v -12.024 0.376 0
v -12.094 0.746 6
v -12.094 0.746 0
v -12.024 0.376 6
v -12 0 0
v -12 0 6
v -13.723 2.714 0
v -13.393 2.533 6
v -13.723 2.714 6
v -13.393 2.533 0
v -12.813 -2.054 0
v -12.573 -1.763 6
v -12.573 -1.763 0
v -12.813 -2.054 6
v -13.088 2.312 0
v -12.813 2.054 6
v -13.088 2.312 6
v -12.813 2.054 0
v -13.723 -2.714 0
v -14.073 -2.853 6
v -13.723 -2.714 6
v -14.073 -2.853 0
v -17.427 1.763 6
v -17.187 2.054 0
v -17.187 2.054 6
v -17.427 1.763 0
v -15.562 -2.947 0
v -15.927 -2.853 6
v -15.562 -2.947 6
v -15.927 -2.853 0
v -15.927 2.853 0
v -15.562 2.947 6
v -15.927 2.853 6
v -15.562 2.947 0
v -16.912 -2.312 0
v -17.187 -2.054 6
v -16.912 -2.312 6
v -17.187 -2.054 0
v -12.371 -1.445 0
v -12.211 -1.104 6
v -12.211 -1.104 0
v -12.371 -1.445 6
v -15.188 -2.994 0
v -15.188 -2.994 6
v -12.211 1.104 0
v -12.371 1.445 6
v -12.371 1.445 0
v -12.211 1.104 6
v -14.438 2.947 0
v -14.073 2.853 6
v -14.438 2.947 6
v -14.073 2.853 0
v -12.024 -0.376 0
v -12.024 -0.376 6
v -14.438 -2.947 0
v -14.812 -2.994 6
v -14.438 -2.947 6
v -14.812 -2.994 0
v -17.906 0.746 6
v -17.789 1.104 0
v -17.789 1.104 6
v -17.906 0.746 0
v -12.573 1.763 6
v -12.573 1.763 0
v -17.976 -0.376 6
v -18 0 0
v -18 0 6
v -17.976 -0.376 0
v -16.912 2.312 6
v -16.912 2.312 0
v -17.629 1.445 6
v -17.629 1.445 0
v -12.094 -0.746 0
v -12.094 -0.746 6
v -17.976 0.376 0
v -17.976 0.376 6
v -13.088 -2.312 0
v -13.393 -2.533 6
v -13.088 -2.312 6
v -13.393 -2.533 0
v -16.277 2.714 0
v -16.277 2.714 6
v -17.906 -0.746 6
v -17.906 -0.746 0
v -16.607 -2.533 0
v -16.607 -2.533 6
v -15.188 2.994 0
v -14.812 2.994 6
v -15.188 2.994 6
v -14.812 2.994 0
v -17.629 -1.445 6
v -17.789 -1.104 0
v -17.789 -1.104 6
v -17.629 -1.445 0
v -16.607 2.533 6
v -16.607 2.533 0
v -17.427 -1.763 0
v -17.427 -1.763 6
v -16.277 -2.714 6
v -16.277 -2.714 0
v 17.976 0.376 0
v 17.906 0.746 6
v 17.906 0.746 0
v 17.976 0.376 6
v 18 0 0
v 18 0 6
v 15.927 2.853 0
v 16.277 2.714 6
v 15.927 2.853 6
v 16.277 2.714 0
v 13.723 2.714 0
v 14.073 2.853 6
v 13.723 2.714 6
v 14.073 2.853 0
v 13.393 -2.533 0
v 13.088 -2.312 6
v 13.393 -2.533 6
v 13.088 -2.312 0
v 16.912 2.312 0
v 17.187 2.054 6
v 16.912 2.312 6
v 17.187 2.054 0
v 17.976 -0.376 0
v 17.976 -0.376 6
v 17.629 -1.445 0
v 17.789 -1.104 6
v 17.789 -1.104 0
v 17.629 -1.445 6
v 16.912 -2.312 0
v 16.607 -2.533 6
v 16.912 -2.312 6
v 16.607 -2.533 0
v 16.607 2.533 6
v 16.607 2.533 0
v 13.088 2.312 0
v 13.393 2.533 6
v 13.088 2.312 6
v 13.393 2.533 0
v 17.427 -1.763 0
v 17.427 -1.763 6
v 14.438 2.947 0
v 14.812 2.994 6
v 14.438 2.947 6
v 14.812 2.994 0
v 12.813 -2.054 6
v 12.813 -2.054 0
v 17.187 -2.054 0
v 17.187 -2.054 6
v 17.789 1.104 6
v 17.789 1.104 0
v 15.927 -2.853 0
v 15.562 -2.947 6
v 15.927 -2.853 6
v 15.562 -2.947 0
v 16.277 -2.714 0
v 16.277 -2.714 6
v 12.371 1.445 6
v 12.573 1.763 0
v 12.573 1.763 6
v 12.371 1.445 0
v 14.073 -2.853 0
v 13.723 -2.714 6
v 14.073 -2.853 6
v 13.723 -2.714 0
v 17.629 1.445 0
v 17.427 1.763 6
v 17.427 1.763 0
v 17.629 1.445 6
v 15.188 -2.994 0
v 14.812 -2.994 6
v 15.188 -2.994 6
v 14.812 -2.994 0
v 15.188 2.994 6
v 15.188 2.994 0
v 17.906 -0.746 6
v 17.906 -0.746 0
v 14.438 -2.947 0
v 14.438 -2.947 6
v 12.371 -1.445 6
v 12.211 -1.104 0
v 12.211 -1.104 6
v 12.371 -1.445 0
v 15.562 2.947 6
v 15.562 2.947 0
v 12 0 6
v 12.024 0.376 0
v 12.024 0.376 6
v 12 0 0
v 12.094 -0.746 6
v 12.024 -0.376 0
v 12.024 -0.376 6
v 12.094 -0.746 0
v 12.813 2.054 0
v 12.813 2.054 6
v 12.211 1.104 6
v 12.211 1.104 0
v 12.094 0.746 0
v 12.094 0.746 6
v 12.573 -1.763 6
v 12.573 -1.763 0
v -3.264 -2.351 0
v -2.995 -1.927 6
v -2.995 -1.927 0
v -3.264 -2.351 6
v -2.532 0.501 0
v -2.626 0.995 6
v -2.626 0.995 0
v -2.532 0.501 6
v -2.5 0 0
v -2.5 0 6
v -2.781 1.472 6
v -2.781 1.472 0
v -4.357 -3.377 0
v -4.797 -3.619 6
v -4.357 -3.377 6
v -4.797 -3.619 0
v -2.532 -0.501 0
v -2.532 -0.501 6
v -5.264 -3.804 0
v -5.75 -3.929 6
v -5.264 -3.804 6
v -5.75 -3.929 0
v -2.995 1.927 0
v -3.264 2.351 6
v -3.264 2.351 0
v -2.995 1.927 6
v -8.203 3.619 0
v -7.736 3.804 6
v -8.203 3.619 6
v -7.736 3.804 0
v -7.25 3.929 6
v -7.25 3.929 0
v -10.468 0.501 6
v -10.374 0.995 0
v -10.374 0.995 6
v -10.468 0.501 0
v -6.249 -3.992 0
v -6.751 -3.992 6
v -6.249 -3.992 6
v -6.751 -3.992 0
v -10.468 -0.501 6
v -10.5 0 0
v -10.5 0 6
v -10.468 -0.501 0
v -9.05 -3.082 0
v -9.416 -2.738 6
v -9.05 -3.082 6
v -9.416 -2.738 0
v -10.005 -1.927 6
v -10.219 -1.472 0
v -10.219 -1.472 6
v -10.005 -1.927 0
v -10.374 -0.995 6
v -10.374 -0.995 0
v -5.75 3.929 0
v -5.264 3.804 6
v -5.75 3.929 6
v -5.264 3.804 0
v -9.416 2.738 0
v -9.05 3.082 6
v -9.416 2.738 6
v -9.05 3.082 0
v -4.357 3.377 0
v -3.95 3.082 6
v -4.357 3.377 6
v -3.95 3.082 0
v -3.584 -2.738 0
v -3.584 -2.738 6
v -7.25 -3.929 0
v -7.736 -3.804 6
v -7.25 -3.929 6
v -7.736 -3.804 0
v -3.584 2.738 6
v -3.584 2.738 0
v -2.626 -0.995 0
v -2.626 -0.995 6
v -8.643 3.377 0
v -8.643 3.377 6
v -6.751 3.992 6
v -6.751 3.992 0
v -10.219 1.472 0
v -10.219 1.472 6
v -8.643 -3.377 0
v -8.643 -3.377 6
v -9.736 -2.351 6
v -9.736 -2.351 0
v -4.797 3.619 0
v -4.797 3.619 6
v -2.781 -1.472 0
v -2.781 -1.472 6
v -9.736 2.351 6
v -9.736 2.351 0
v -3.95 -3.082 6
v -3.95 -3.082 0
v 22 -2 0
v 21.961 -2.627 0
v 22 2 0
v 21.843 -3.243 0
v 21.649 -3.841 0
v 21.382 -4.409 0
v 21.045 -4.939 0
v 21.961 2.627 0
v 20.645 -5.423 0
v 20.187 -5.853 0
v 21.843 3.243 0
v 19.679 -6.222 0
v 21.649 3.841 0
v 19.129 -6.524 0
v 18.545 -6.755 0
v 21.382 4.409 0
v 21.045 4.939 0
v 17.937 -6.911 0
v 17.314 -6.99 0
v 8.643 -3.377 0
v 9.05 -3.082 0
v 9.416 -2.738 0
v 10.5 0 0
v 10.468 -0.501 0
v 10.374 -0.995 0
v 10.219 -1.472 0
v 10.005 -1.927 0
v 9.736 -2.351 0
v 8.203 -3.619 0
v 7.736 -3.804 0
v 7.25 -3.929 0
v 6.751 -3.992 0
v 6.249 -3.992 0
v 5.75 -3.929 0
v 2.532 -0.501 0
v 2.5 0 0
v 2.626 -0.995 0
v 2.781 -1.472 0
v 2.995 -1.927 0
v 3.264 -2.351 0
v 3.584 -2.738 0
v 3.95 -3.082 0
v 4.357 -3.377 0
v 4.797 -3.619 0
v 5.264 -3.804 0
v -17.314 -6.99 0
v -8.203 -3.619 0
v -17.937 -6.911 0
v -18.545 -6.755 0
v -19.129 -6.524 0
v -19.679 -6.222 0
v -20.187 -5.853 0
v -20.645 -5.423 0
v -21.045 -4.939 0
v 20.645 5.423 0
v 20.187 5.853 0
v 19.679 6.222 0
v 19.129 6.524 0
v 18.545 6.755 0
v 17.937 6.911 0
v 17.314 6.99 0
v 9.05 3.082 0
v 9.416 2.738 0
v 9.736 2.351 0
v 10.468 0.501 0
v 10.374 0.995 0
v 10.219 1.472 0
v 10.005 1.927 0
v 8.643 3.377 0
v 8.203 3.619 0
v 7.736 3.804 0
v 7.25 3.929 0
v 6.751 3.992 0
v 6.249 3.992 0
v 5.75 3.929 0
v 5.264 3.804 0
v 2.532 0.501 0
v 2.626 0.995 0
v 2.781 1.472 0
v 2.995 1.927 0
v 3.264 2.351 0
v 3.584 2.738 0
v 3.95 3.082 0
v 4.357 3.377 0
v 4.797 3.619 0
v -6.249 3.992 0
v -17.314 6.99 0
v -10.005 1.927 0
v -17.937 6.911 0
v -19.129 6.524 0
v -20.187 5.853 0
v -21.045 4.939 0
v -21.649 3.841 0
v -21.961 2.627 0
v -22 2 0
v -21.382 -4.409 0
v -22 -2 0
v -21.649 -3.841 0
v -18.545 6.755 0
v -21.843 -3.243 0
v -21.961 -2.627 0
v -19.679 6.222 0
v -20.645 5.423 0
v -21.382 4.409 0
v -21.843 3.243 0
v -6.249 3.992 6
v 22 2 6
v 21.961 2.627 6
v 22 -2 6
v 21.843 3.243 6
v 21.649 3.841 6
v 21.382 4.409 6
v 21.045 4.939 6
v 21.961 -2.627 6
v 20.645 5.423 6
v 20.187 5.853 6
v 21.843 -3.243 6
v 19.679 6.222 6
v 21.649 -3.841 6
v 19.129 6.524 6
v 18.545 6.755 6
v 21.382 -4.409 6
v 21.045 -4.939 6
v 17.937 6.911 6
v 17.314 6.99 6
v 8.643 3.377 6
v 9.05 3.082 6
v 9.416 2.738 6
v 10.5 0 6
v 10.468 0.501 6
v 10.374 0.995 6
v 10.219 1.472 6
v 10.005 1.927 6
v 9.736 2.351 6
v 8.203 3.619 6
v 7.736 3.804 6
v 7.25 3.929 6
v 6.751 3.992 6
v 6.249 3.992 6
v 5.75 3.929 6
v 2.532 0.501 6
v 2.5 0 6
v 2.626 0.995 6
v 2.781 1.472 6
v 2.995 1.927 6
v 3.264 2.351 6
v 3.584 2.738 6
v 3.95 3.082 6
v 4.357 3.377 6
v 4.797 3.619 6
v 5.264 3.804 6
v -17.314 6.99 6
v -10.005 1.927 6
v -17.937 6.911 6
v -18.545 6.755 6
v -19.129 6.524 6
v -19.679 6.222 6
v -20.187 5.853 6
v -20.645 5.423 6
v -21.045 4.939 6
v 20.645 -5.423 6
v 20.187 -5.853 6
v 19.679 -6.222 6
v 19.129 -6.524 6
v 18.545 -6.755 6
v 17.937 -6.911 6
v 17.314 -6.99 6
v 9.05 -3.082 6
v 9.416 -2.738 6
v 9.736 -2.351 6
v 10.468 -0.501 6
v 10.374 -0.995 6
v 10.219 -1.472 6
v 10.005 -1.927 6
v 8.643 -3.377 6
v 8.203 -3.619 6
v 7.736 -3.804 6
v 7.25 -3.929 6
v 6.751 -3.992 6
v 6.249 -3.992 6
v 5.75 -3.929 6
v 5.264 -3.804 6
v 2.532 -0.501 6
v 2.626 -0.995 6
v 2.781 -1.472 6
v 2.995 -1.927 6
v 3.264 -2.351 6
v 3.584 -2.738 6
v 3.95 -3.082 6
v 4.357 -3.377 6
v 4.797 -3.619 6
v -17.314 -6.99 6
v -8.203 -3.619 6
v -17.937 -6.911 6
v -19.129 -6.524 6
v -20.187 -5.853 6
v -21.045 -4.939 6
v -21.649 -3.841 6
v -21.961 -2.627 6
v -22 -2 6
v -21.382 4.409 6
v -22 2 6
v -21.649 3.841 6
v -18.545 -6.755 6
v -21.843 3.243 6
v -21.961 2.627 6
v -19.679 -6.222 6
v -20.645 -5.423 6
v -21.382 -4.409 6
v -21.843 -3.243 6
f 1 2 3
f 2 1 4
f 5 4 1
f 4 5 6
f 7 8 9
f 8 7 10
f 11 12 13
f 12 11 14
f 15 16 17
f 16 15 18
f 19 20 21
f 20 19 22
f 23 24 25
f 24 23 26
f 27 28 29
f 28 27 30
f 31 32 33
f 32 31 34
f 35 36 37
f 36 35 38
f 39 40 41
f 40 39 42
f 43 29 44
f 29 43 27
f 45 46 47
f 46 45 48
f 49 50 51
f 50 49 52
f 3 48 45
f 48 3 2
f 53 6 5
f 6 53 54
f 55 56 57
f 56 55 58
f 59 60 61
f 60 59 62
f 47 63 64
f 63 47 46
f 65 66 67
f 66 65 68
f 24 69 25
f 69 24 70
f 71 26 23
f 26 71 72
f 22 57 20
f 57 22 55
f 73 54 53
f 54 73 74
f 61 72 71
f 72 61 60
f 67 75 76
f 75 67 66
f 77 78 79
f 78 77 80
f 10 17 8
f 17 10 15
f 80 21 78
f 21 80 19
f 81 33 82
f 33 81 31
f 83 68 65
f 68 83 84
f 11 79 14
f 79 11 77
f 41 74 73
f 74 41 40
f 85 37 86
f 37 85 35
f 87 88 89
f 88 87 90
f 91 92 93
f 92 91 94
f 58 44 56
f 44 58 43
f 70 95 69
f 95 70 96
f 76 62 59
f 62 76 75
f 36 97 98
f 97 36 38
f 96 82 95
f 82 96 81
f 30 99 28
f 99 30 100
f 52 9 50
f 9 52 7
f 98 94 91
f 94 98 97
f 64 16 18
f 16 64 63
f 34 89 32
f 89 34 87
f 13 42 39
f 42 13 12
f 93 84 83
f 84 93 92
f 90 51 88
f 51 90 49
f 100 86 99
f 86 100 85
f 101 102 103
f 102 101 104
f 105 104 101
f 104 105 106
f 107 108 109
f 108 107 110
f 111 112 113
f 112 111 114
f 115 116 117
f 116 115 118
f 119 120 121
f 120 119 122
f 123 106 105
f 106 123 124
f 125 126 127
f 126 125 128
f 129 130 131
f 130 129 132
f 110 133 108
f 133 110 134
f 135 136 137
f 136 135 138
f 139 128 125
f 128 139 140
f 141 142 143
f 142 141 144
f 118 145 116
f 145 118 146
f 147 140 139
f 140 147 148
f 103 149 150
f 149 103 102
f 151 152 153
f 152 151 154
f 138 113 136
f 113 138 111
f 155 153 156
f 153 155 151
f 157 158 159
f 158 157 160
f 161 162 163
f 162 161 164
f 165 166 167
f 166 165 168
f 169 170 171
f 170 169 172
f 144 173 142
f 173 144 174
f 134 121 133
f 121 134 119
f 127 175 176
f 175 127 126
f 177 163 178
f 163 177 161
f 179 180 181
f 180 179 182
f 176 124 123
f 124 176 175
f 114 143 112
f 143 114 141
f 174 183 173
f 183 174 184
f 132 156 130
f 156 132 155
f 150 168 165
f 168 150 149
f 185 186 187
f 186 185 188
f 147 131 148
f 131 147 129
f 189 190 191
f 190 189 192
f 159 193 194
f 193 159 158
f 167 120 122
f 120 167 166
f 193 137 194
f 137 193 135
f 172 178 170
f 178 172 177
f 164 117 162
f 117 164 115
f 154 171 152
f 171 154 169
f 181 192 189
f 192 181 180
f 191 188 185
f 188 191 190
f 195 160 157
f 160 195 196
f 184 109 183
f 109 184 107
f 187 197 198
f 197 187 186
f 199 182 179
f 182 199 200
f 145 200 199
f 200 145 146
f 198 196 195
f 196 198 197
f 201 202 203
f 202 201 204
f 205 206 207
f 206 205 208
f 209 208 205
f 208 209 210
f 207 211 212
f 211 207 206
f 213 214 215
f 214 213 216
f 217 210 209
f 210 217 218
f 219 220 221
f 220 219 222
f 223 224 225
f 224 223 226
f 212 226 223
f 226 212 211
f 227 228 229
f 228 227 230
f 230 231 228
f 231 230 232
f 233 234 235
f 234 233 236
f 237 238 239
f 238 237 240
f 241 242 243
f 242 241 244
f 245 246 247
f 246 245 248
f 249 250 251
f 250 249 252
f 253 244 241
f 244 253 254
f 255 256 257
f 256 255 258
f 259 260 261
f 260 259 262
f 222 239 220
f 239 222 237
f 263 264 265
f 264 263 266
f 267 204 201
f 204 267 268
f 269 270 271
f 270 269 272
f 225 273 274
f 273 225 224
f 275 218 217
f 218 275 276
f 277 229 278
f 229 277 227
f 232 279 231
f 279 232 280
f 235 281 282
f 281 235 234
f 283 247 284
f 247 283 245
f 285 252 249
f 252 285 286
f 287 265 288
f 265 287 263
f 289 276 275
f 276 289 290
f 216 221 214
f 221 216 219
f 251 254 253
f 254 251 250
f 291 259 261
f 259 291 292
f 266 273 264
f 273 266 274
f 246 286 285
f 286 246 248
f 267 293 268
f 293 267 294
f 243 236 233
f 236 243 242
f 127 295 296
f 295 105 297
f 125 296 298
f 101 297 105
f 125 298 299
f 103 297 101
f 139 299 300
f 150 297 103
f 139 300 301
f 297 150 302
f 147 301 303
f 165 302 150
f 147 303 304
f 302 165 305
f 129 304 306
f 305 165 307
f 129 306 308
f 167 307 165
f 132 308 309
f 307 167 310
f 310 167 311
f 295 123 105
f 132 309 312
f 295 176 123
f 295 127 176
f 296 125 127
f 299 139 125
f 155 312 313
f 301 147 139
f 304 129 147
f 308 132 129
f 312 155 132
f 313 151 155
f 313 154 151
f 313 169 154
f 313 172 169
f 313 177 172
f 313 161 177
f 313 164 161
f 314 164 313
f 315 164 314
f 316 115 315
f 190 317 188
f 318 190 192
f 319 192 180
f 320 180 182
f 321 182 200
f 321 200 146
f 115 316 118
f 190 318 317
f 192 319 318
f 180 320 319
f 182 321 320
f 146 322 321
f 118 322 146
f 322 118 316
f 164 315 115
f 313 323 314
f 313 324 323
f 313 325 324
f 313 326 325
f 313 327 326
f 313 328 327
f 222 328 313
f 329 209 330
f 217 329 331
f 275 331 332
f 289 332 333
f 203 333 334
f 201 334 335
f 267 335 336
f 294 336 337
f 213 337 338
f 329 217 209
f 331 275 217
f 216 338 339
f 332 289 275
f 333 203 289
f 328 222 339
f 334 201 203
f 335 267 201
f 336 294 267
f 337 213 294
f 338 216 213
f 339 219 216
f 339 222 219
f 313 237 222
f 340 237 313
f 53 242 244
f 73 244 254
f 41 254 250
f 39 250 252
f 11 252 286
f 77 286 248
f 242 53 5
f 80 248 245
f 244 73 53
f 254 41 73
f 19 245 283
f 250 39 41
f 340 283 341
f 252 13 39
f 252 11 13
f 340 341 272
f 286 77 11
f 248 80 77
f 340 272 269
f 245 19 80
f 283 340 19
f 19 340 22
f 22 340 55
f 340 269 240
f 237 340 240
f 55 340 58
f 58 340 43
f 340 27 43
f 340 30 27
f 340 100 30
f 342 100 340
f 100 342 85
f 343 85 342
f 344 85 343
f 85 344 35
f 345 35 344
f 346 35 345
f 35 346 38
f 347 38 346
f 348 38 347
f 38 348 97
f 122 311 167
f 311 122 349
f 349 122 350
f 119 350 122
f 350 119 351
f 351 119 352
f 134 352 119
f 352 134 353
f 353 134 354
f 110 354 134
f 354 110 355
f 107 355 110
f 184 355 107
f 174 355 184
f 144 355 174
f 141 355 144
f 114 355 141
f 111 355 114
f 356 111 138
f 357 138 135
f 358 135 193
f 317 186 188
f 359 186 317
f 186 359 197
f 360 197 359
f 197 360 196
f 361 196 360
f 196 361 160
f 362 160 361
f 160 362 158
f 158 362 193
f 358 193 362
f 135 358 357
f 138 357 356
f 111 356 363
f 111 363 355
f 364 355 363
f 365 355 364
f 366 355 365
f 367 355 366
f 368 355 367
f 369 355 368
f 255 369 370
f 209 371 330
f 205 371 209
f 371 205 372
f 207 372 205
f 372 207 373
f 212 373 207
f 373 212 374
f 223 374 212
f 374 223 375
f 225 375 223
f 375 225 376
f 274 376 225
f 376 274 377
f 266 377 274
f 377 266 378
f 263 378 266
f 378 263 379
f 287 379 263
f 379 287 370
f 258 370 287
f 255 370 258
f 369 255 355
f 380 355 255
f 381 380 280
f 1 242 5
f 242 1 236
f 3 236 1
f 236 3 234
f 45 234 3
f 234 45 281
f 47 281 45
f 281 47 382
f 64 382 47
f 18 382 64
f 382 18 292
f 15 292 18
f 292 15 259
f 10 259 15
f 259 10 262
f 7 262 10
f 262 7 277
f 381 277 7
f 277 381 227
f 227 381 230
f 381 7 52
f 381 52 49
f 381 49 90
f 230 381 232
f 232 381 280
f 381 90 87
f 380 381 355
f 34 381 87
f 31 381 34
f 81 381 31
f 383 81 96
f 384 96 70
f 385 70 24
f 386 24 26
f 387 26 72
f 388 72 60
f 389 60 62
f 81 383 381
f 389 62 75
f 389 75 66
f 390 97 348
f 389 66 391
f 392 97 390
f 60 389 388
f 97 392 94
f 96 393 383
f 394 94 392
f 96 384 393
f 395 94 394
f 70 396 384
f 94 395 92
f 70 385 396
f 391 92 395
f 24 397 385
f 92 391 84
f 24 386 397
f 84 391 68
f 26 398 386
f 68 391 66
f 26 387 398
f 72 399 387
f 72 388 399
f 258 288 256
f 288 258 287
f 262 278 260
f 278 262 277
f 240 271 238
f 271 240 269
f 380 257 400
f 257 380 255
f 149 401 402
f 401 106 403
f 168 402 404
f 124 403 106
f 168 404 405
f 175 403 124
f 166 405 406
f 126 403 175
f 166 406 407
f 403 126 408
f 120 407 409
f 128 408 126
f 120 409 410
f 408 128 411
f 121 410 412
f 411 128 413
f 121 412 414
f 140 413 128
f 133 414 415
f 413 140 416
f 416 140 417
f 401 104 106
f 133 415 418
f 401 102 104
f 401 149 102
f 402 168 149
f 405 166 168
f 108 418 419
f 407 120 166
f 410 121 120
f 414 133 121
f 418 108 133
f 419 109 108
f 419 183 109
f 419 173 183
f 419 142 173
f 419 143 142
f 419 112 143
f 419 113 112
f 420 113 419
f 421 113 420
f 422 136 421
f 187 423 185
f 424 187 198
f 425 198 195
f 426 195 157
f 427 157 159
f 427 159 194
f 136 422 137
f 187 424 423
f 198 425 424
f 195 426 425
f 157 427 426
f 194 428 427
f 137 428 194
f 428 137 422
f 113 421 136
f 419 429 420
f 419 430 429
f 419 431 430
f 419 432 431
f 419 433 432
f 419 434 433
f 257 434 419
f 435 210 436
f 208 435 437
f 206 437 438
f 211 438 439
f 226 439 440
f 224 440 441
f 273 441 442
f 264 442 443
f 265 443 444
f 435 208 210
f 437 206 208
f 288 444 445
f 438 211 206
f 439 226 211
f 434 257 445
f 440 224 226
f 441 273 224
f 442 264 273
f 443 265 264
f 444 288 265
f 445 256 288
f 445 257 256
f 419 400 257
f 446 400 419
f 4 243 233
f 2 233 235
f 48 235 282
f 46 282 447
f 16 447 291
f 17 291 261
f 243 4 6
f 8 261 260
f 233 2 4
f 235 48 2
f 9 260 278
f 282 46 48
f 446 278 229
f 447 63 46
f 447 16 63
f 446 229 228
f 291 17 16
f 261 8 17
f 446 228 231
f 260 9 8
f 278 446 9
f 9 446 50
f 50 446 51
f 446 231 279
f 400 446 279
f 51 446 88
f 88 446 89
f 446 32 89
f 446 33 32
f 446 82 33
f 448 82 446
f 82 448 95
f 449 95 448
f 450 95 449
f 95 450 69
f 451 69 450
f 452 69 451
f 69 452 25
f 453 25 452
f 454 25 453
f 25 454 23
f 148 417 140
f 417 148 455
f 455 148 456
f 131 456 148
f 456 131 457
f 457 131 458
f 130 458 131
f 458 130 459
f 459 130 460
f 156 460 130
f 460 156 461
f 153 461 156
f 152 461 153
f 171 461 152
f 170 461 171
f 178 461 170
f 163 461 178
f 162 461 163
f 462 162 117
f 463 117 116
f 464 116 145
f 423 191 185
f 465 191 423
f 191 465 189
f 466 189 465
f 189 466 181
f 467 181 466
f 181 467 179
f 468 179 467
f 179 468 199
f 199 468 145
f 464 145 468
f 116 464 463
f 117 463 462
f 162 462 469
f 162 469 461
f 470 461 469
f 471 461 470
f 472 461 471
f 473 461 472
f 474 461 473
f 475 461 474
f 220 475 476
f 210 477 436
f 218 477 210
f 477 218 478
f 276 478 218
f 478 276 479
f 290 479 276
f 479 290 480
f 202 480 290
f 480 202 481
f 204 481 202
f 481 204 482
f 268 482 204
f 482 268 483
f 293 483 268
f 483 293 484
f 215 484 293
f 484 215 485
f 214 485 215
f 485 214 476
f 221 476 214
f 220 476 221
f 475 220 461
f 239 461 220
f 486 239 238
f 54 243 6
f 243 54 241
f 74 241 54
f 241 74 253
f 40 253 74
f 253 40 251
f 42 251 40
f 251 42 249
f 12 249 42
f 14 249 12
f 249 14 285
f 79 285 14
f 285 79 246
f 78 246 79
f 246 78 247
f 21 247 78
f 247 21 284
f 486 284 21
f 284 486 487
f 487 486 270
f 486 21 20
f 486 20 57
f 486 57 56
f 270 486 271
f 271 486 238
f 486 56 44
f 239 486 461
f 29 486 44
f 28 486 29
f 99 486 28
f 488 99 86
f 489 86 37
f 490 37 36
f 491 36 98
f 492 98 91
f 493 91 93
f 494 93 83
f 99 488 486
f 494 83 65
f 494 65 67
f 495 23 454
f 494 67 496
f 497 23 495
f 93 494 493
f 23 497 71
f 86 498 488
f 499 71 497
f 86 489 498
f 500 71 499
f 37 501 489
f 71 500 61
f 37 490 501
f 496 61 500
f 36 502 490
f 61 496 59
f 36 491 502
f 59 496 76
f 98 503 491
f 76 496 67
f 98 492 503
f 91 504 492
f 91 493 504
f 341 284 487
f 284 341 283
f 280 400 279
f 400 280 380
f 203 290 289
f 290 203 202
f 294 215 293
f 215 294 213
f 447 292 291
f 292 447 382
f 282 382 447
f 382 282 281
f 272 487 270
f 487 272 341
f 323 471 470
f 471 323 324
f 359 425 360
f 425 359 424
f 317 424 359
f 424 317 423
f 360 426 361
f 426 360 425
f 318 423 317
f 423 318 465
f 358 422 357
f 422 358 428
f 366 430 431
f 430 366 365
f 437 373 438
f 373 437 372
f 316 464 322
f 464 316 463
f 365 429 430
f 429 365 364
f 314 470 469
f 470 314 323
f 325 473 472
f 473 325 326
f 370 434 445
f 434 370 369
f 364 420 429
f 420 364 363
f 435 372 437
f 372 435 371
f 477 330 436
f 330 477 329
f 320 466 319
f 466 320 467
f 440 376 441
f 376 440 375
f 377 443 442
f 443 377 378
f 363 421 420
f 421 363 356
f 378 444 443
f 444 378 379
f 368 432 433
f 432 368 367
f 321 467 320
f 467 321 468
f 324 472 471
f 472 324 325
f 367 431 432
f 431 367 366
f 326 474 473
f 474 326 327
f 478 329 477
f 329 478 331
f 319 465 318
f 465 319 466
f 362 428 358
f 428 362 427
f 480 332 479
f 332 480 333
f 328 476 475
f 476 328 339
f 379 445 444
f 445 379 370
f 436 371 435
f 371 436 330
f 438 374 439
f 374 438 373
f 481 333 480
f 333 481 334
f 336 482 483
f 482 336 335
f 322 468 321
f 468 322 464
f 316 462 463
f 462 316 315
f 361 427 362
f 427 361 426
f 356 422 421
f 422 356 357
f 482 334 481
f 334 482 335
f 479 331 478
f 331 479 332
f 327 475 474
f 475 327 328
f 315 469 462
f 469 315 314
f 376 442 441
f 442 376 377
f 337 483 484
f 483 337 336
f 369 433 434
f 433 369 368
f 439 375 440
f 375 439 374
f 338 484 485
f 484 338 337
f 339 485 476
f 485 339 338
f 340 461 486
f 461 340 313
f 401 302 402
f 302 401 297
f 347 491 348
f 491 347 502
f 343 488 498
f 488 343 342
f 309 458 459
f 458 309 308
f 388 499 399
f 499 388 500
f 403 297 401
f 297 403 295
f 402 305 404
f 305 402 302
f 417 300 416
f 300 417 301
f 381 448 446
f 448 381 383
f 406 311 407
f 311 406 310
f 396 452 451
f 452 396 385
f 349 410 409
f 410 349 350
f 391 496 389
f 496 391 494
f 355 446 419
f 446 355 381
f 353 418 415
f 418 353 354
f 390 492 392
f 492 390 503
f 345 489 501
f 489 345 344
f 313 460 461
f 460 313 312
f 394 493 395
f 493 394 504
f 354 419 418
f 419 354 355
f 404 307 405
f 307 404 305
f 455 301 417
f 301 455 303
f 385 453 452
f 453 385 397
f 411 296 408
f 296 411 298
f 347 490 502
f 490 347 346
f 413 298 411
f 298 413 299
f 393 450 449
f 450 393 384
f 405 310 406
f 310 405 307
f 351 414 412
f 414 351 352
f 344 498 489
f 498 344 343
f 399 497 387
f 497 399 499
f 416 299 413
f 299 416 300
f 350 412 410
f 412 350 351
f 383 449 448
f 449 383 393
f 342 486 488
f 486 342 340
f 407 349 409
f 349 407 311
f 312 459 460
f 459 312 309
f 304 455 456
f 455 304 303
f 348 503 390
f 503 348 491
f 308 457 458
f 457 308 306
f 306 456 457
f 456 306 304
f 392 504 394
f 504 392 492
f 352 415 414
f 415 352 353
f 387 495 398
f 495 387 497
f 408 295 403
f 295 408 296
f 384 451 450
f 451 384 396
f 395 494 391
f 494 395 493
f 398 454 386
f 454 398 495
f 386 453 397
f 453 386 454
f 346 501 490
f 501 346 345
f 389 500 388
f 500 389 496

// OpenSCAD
$fn = 50;


difference() {
	union() {
		hull() {
			translate(v = [-17.0000000000, 2.0000000000, 0]) {
				cylinder(h = 6, r = 5);
			}
			translate(v = [17.0000000000, 2.0000000000, 0]) {
				cylinder(h = 6, r = 5);
			}
			translate(v = [-17.0000000000, -2.0000000000, 0]) {
				cylinder(h = 6, r = 5);
			}
			translate(v = [17.0000000000, -2.0000000000, 0]) {
				cylinder(h = 6, r = 5);
			}
		}
	}
	union() {
		#translate(v = [-15.0000000000, 0.0000000000, 0]) {
			cylinder(h = 6, r = 3.0000000000);
		}
		#translate(v = [15.0000000000, 0.0000000000, 0]) {
			cylinder(h = 6, r = 3.0000000000);
		}
		#translate(v = [-15.0000000000, 0.0000000000, -100.0000000000]) {
			cylinder(h = 200, r = 3.0000000000);
		}
		#translate(v = [-15.0000000000, 0.0000000000, -100.0000000000]) {
			cylinder(h = 200, r = 3.0000000000);
		}
		#translate(v = [15.0000000000, 0.0000000000, -100.0000000000]) {
			cylinder(h = 200, r = 3.0000000000);
		}
		#translate(v = [15.0000000000, 0.0000000000, -100.0000000000]) {
			cylinder(h = 200, r = 3.0000000000);
		}
		#translate(v = [-15.0000000000, 0.0000000000, 0]) {
			cylinder(h = 6, r = 1.5000000000);
		}
		#translate(v = [15.0000000000, 0.0000000000, 0]) {
			cylinder(h = 6, r = 1.5000000000);
		}
		#translate(v = [-15.0000000000, 0.0000000000, 0]) {
			cylinder(h = 6, r = 1.5000000000);
		}
		#translate(v = [15.0000000000, 0.0000000000, 0]) {
			cylinder(h = 6, r = 1.5000000000);
		}
		#translate(v = [-15.0000000000, 0.0000000000, 0]) {
			cylinder(h = 6, r = 1.5000000000);
		}
		#translate(v = [15.0000000000, 0.0000000000, 0]) {
			cylinder(h = 6, r = 1.5000000000);
		}
		#translate(v = [-6.5000000000, 0, 0]) {
			cylinder(h = 6, r = 4.0000000000);
		}
		#translate(v = [6.5000000000, 0, 0]) {
			cylinder(h = 6, r = 4.0000000000);
		}
	}
}
